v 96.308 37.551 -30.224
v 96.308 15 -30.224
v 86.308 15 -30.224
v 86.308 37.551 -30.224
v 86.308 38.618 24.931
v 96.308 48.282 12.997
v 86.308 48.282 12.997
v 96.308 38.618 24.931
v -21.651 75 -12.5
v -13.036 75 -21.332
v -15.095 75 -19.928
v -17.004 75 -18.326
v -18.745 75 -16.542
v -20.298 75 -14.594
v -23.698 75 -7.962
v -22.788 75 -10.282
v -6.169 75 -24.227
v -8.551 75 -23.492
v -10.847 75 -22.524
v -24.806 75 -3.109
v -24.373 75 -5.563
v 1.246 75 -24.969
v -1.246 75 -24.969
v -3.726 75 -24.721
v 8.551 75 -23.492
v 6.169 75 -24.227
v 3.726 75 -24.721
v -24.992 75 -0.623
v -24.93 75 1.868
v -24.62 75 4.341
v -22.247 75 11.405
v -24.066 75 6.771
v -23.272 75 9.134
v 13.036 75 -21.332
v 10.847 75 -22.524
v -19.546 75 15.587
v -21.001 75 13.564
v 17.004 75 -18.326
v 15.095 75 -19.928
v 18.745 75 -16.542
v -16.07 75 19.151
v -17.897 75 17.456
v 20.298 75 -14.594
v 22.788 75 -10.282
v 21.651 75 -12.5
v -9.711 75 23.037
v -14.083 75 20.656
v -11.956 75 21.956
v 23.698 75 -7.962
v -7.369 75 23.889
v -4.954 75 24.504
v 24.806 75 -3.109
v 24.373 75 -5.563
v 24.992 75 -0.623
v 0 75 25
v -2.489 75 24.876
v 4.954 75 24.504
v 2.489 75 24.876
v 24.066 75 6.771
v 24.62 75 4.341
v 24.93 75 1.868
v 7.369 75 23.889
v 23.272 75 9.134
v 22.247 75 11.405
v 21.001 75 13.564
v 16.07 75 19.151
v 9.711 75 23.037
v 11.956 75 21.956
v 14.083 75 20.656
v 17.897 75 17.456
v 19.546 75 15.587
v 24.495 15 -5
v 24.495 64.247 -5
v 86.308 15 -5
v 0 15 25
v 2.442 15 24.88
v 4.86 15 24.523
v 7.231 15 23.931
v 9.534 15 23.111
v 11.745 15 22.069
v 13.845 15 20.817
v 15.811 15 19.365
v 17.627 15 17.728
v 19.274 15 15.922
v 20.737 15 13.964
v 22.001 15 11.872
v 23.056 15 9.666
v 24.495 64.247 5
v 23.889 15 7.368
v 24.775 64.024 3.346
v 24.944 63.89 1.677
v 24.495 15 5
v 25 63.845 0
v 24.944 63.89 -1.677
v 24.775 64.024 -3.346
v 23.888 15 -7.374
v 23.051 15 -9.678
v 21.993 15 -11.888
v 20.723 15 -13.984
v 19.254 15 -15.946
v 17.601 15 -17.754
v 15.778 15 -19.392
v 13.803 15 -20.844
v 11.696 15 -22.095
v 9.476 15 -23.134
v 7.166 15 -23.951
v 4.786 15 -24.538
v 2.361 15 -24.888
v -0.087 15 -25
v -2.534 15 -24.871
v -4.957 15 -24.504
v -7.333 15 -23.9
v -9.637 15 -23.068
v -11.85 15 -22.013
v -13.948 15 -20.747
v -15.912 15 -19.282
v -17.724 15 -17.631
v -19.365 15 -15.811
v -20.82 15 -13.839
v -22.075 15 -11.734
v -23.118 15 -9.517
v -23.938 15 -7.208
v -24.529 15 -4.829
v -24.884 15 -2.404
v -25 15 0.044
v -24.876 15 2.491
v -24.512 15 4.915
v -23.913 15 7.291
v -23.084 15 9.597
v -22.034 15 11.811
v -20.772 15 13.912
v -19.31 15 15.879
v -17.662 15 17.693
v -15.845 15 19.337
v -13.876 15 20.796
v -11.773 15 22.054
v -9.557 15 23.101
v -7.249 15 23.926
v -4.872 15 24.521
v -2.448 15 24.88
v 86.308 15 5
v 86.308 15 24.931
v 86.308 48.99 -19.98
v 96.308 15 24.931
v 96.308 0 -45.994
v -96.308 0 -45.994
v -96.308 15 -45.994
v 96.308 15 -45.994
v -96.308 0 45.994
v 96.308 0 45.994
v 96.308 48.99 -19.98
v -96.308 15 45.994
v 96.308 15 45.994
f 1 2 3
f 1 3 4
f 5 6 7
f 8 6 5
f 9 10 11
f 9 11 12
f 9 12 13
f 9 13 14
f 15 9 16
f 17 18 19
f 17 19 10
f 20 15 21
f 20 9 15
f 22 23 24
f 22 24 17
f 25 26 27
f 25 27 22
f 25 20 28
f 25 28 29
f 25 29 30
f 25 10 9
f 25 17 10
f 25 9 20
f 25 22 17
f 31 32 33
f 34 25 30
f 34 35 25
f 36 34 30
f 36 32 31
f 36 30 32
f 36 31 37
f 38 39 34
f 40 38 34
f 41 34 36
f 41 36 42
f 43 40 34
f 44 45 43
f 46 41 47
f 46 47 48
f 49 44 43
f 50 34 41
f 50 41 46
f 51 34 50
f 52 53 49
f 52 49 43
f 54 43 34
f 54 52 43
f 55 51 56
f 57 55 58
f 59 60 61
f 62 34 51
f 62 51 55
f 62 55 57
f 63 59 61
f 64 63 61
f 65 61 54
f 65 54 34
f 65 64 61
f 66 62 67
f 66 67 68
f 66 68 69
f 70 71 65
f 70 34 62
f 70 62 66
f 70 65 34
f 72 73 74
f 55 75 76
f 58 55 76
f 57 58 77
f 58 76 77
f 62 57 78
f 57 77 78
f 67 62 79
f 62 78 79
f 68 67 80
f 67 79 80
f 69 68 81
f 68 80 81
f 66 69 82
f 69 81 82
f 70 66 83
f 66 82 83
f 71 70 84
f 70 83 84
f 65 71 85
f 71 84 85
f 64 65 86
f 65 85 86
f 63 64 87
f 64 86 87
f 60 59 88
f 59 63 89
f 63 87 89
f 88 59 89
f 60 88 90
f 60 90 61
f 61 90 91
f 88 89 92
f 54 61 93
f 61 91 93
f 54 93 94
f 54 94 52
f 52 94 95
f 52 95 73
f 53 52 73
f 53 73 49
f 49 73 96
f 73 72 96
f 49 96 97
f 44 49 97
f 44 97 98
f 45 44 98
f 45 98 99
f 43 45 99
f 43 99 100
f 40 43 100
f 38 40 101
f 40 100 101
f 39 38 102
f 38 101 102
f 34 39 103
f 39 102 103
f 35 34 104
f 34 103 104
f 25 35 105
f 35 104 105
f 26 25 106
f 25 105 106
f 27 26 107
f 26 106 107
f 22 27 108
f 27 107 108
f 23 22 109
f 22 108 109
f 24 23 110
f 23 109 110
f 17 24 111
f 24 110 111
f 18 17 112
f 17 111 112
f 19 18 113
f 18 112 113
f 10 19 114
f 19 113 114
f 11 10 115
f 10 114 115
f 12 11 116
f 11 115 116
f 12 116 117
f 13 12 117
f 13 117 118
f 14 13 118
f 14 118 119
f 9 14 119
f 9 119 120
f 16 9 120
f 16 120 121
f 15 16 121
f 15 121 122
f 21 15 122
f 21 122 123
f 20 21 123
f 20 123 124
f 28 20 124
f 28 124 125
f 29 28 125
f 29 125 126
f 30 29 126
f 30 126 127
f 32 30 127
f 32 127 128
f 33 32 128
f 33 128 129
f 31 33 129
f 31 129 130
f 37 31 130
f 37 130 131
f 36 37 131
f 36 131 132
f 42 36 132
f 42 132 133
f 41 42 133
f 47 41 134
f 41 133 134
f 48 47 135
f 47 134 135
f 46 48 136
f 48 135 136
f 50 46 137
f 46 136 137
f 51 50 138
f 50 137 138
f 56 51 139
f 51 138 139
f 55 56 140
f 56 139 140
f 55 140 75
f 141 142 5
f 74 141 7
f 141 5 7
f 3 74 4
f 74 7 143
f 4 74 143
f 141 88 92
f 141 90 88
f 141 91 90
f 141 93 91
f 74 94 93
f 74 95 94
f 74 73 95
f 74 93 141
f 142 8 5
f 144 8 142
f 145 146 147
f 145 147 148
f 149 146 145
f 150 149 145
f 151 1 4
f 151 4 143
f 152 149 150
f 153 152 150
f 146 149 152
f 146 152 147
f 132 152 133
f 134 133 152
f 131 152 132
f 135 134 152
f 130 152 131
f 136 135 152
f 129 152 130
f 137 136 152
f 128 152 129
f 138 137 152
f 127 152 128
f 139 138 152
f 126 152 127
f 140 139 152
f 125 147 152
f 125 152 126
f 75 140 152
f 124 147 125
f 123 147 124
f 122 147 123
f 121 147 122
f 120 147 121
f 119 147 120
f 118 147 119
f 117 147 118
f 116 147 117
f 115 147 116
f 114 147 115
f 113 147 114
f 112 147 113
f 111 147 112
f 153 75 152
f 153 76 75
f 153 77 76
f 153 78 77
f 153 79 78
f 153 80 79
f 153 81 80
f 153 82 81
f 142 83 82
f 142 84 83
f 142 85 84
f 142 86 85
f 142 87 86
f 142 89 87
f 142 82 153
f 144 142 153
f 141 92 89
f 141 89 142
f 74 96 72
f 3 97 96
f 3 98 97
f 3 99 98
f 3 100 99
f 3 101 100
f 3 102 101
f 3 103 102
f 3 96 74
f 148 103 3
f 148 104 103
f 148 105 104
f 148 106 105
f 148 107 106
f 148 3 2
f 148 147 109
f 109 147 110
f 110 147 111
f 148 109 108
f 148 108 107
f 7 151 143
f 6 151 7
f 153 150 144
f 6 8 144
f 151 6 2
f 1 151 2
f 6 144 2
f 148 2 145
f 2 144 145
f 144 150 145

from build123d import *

# Parameters (mm, degrees)
ESQUISSE1_W        = 192.615231554
ESQUISSE1_H        = 91.988888612
BOSS_EXTRU_1_DEPTH = 15
ESQUISSE3_R        = 25
BOSS_EXTRU_2_DEPTH = 60
BOSS_EXTRU_3_DEPTH = 10
NERVURE1_REACH     = 132.444
ESQUISSE5_WALL_W   = 340.670663134
ESQUISSE5_WALL_H   = 10


with BuildPart() as part:
    # Esquisse1 → Boss.-Extru.1 (new body)
    with BuildSketch(Plane(origin=(0, 0, 0), x_dir=(1, 0, 0), z_dir=(0, 1, 0))):
        Rectangle(ESQUISSE1_W, ESQUISSE1_H)
    extrude(amount=BOSS_EXTRU_1_DEPTH)

    # Esquisse3 → Boss.-Extru.2 (add)
    with BuildSketch(Plane(origin=(0, 15, 0), x_dir=(1, 0, 0), z_dir=(0, 1, 0))):
        with Locations(Location((0, 0, 0), (0, 0, 270))):
            Circle(ESQUISSE3_R)
    extrude(amount=BOSS_EXTRU_2_DEPTH)

    # Esquisse4 → Boss.-Extru.3 (add)
    with BuildSketch(Plane(origin=(96.307615777, 0, 0), x_dir=(0, 0, -1), z_dir=(1, 0, 0))):
        Polygon((-24.930682443, 15), (30.224142476, 15), (30.224142476, 37.550884027), (19.979617808, 48.99012657), (-12.997025488, 48.281884538), (-24.930682443, 38.617807381), align=None)
    extrude(amount=-BOSS_EXTRU_3_DEPTH)

    # Esquisse5 wall → Nervure1 (add, up to next)
    with BuildSketch(Plane(origin=(55.88995931, 39.234258268, 0), x_dir=(0.782119847954, -0.623128031336, 0), z_dir=(0.623128031336, 0.782119847954, 0)), mode=Mode.PRIVATE) as nervure1_sk1:
        Rectangle(ESQUISSE5_WALL_W, ESQUISSE5_WALL_H)
    nervure1_tool1 = extrude(nervure1_sk1.sketch, amount=-NERVURE1_REACH, mode=Mode.PRIVATE) - part.part
    add(nervure1_tool1.solids().sort_by_distance((55.88995931, 39.234258268, 0))[0])


solid = part.part
